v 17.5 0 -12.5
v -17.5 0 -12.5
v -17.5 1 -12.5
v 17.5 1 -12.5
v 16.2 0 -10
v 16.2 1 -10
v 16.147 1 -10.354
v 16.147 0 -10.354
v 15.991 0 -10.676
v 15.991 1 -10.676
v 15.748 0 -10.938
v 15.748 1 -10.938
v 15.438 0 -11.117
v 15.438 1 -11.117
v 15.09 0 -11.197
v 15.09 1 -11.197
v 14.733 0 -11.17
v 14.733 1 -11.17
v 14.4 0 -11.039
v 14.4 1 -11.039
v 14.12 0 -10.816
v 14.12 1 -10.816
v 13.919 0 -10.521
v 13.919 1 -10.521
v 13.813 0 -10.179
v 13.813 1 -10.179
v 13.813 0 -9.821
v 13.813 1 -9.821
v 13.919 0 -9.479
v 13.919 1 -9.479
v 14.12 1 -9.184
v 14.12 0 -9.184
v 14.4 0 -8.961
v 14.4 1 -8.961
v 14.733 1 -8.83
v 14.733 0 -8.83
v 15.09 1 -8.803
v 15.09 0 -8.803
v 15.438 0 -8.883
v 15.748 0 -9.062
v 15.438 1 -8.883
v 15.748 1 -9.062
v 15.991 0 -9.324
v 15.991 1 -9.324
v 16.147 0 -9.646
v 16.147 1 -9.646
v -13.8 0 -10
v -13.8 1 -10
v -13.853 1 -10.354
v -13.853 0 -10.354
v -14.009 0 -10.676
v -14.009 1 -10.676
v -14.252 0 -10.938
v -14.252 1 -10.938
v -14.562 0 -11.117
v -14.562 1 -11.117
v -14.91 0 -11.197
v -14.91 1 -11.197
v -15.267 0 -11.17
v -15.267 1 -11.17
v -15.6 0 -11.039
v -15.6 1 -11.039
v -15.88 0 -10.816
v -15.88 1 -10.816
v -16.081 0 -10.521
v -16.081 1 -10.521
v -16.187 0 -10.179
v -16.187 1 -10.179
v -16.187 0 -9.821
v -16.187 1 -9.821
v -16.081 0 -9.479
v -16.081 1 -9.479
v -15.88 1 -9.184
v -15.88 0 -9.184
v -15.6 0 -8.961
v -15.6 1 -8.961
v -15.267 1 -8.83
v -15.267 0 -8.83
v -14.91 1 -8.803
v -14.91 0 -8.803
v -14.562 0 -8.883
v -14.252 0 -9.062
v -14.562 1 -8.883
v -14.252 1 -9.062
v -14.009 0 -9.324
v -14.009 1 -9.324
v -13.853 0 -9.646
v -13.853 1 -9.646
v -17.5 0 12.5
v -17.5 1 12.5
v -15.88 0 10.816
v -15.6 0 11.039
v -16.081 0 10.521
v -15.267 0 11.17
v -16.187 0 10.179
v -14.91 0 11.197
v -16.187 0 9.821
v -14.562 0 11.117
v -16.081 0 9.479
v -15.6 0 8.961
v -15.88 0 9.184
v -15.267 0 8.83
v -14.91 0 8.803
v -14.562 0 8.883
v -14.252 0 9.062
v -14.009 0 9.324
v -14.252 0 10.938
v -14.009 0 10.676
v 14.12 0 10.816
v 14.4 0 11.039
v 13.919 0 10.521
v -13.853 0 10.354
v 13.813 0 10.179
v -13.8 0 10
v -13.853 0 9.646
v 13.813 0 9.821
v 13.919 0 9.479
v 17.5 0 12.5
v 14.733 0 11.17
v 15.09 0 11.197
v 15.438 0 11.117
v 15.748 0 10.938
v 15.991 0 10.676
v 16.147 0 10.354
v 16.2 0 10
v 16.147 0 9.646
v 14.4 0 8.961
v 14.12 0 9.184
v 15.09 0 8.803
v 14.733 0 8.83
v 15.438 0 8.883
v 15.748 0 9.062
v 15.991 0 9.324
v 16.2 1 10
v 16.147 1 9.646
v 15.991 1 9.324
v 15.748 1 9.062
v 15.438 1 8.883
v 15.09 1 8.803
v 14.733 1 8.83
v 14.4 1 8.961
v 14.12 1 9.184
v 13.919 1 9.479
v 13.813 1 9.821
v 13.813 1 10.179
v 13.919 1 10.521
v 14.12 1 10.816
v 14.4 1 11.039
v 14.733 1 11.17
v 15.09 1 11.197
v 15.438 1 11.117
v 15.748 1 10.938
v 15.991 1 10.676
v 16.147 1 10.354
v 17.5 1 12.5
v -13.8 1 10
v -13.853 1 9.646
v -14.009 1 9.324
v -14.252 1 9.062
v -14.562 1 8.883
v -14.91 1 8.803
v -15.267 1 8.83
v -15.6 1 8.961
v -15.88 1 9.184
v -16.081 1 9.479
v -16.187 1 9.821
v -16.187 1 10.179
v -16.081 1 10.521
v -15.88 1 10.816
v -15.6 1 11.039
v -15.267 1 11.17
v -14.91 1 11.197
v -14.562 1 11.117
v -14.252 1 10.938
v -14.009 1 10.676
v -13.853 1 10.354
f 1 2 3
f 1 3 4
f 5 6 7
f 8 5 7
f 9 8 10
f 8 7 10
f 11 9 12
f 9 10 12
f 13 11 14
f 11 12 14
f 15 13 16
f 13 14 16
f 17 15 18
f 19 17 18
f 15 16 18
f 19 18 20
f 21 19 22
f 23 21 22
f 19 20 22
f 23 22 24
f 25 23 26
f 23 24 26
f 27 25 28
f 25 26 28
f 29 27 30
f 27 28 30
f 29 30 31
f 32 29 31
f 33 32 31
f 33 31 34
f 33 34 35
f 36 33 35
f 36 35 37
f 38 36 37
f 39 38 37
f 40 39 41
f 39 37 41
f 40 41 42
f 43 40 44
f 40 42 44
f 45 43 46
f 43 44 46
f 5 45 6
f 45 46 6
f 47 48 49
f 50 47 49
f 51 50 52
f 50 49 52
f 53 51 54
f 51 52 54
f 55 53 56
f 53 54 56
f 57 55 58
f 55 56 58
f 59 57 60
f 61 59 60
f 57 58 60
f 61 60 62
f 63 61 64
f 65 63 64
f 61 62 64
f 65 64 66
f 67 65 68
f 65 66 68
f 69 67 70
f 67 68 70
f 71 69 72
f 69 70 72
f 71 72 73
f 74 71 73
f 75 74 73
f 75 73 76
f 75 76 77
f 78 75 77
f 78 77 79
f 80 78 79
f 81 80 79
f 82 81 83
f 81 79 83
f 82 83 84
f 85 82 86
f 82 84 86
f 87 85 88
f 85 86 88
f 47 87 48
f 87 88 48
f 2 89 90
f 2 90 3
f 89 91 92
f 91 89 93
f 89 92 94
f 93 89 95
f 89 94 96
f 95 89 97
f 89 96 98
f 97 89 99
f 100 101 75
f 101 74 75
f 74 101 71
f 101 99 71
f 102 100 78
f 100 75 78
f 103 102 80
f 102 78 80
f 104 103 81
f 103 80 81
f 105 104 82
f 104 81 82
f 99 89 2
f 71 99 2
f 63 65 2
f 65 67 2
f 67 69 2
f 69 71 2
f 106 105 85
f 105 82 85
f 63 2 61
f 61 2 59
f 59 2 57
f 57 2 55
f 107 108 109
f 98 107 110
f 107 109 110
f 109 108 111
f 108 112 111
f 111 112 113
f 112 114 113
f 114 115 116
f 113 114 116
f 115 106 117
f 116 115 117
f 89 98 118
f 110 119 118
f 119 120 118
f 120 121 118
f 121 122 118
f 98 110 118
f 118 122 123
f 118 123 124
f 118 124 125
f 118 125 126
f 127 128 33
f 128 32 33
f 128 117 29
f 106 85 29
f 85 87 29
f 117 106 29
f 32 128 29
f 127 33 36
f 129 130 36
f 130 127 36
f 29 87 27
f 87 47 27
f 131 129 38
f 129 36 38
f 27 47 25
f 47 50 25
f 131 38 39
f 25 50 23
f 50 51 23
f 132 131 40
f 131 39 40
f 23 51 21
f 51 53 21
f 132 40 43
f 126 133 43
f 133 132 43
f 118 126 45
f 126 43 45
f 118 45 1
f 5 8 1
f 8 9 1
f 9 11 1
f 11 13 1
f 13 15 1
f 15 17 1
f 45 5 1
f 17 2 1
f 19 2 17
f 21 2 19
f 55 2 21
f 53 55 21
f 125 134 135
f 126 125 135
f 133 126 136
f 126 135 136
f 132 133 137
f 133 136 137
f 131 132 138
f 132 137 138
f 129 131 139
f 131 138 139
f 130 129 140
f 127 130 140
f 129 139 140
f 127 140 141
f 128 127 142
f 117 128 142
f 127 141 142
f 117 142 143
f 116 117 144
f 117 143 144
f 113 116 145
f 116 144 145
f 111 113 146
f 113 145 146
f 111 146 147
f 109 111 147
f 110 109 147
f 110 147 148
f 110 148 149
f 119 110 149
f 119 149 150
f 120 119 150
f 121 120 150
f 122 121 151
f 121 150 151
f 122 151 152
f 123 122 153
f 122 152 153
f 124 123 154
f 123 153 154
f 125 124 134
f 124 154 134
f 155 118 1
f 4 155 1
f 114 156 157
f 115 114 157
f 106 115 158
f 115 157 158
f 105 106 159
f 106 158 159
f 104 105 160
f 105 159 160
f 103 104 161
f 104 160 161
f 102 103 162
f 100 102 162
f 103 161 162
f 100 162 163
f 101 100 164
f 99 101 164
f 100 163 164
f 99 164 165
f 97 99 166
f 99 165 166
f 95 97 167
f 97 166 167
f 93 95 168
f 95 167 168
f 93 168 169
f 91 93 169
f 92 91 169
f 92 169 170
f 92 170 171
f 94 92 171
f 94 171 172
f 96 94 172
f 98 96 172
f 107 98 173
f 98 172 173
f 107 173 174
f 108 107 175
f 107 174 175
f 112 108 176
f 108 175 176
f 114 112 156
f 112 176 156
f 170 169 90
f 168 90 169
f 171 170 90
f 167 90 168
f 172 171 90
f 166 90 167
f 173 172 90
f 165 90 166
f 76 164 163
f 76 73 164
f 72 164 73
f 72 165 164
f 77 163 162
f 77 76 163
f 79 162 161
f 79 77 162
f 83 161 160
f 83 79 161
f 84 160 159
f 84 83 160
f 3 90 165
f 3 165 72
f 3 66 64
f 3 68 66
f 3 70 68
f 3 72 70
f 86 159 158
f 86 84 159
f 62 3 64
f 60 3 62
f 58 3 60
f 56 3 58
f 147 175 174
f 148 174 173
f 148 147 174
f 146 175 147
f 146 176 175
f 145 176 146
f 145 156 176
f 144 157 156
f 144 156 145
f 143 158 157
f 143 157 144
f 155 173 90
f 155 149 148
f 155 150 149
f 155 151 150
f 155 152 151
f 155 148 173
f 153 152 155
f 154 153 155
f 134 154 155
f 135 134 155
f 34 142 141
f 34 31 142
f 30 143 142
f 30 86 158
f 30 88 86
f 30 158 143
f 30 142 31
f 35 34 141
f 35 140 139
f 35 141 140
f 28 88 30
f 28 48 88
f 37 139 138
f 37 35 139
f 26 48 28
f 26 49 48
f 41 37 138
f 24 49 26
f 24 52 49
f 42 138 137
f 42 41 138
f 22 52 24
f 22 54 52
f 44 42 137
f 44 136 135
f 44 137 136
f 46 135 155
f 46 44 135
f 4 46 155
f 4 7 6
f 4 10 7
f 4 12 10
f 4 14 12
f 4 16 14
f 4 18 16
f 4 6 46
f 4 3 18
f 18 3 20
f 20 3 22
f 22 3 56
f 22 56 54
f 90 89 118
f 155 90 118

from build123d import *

# Parameters (mm, degrees)
SKICA2_W                 = 35
SKICA2_H                 = 25
P_IDAT_VYSUNUT_M1_DEPTH  = 1
SKICA3_R                 = 1.2
ODEBRAT_VYSUNUT_M1_DEPTH = 1
LINPOLE1_COUNT           = 2
LINPOLE1_PITCH           = 30
LINPOLE1_COUNT_DIR2      = 2
LINPOLE1_PITCH_DIR2      = 20


with BuildPart() as part:
    # Skica2 → Přidat vysunutím1 (new body)
    with BuildSketch(Plane(origin=(0, 0, 0), x_dir=(1, 0, 0), z_dir=(0, 1, 0))):
        Rectangle(SKICA2_W, SKICA2_H)
    extrude(amount=P_IDAT_VYSUNUT_M1_DEPTH)

    # Skica3 → Odebrat vysunutím1 (cut)
    with BuildSketch(Plane(origin=(0, 1, 0), x_dir=(1, 0, 0), z_dir=(0, 1, 0))):
        with Locations((-15, 10)):
            Circle(SKICA3_R)
    odebrat_vysunut_m1 = extrude(amount=-ODEBRAT_VYSUNUT_M1_DEPTH, mode=Mode.SUBTRACT)

    # LinPole1: Odebrat vysunut_m1 2 × 2
    with Locations(*[(i * LINPOLE1_PITCH, 0, j * LINPOLE1_PITCH_DIR2) for i in range(LINPOLE1_COUNT) for j in range(LINPOLE1_COUNT_DIR2) if (i, j) != (0, 0)]):
        add(odebrat_vysunut_m1, mode=Mode.SUBTRACT)


solid = part.part
